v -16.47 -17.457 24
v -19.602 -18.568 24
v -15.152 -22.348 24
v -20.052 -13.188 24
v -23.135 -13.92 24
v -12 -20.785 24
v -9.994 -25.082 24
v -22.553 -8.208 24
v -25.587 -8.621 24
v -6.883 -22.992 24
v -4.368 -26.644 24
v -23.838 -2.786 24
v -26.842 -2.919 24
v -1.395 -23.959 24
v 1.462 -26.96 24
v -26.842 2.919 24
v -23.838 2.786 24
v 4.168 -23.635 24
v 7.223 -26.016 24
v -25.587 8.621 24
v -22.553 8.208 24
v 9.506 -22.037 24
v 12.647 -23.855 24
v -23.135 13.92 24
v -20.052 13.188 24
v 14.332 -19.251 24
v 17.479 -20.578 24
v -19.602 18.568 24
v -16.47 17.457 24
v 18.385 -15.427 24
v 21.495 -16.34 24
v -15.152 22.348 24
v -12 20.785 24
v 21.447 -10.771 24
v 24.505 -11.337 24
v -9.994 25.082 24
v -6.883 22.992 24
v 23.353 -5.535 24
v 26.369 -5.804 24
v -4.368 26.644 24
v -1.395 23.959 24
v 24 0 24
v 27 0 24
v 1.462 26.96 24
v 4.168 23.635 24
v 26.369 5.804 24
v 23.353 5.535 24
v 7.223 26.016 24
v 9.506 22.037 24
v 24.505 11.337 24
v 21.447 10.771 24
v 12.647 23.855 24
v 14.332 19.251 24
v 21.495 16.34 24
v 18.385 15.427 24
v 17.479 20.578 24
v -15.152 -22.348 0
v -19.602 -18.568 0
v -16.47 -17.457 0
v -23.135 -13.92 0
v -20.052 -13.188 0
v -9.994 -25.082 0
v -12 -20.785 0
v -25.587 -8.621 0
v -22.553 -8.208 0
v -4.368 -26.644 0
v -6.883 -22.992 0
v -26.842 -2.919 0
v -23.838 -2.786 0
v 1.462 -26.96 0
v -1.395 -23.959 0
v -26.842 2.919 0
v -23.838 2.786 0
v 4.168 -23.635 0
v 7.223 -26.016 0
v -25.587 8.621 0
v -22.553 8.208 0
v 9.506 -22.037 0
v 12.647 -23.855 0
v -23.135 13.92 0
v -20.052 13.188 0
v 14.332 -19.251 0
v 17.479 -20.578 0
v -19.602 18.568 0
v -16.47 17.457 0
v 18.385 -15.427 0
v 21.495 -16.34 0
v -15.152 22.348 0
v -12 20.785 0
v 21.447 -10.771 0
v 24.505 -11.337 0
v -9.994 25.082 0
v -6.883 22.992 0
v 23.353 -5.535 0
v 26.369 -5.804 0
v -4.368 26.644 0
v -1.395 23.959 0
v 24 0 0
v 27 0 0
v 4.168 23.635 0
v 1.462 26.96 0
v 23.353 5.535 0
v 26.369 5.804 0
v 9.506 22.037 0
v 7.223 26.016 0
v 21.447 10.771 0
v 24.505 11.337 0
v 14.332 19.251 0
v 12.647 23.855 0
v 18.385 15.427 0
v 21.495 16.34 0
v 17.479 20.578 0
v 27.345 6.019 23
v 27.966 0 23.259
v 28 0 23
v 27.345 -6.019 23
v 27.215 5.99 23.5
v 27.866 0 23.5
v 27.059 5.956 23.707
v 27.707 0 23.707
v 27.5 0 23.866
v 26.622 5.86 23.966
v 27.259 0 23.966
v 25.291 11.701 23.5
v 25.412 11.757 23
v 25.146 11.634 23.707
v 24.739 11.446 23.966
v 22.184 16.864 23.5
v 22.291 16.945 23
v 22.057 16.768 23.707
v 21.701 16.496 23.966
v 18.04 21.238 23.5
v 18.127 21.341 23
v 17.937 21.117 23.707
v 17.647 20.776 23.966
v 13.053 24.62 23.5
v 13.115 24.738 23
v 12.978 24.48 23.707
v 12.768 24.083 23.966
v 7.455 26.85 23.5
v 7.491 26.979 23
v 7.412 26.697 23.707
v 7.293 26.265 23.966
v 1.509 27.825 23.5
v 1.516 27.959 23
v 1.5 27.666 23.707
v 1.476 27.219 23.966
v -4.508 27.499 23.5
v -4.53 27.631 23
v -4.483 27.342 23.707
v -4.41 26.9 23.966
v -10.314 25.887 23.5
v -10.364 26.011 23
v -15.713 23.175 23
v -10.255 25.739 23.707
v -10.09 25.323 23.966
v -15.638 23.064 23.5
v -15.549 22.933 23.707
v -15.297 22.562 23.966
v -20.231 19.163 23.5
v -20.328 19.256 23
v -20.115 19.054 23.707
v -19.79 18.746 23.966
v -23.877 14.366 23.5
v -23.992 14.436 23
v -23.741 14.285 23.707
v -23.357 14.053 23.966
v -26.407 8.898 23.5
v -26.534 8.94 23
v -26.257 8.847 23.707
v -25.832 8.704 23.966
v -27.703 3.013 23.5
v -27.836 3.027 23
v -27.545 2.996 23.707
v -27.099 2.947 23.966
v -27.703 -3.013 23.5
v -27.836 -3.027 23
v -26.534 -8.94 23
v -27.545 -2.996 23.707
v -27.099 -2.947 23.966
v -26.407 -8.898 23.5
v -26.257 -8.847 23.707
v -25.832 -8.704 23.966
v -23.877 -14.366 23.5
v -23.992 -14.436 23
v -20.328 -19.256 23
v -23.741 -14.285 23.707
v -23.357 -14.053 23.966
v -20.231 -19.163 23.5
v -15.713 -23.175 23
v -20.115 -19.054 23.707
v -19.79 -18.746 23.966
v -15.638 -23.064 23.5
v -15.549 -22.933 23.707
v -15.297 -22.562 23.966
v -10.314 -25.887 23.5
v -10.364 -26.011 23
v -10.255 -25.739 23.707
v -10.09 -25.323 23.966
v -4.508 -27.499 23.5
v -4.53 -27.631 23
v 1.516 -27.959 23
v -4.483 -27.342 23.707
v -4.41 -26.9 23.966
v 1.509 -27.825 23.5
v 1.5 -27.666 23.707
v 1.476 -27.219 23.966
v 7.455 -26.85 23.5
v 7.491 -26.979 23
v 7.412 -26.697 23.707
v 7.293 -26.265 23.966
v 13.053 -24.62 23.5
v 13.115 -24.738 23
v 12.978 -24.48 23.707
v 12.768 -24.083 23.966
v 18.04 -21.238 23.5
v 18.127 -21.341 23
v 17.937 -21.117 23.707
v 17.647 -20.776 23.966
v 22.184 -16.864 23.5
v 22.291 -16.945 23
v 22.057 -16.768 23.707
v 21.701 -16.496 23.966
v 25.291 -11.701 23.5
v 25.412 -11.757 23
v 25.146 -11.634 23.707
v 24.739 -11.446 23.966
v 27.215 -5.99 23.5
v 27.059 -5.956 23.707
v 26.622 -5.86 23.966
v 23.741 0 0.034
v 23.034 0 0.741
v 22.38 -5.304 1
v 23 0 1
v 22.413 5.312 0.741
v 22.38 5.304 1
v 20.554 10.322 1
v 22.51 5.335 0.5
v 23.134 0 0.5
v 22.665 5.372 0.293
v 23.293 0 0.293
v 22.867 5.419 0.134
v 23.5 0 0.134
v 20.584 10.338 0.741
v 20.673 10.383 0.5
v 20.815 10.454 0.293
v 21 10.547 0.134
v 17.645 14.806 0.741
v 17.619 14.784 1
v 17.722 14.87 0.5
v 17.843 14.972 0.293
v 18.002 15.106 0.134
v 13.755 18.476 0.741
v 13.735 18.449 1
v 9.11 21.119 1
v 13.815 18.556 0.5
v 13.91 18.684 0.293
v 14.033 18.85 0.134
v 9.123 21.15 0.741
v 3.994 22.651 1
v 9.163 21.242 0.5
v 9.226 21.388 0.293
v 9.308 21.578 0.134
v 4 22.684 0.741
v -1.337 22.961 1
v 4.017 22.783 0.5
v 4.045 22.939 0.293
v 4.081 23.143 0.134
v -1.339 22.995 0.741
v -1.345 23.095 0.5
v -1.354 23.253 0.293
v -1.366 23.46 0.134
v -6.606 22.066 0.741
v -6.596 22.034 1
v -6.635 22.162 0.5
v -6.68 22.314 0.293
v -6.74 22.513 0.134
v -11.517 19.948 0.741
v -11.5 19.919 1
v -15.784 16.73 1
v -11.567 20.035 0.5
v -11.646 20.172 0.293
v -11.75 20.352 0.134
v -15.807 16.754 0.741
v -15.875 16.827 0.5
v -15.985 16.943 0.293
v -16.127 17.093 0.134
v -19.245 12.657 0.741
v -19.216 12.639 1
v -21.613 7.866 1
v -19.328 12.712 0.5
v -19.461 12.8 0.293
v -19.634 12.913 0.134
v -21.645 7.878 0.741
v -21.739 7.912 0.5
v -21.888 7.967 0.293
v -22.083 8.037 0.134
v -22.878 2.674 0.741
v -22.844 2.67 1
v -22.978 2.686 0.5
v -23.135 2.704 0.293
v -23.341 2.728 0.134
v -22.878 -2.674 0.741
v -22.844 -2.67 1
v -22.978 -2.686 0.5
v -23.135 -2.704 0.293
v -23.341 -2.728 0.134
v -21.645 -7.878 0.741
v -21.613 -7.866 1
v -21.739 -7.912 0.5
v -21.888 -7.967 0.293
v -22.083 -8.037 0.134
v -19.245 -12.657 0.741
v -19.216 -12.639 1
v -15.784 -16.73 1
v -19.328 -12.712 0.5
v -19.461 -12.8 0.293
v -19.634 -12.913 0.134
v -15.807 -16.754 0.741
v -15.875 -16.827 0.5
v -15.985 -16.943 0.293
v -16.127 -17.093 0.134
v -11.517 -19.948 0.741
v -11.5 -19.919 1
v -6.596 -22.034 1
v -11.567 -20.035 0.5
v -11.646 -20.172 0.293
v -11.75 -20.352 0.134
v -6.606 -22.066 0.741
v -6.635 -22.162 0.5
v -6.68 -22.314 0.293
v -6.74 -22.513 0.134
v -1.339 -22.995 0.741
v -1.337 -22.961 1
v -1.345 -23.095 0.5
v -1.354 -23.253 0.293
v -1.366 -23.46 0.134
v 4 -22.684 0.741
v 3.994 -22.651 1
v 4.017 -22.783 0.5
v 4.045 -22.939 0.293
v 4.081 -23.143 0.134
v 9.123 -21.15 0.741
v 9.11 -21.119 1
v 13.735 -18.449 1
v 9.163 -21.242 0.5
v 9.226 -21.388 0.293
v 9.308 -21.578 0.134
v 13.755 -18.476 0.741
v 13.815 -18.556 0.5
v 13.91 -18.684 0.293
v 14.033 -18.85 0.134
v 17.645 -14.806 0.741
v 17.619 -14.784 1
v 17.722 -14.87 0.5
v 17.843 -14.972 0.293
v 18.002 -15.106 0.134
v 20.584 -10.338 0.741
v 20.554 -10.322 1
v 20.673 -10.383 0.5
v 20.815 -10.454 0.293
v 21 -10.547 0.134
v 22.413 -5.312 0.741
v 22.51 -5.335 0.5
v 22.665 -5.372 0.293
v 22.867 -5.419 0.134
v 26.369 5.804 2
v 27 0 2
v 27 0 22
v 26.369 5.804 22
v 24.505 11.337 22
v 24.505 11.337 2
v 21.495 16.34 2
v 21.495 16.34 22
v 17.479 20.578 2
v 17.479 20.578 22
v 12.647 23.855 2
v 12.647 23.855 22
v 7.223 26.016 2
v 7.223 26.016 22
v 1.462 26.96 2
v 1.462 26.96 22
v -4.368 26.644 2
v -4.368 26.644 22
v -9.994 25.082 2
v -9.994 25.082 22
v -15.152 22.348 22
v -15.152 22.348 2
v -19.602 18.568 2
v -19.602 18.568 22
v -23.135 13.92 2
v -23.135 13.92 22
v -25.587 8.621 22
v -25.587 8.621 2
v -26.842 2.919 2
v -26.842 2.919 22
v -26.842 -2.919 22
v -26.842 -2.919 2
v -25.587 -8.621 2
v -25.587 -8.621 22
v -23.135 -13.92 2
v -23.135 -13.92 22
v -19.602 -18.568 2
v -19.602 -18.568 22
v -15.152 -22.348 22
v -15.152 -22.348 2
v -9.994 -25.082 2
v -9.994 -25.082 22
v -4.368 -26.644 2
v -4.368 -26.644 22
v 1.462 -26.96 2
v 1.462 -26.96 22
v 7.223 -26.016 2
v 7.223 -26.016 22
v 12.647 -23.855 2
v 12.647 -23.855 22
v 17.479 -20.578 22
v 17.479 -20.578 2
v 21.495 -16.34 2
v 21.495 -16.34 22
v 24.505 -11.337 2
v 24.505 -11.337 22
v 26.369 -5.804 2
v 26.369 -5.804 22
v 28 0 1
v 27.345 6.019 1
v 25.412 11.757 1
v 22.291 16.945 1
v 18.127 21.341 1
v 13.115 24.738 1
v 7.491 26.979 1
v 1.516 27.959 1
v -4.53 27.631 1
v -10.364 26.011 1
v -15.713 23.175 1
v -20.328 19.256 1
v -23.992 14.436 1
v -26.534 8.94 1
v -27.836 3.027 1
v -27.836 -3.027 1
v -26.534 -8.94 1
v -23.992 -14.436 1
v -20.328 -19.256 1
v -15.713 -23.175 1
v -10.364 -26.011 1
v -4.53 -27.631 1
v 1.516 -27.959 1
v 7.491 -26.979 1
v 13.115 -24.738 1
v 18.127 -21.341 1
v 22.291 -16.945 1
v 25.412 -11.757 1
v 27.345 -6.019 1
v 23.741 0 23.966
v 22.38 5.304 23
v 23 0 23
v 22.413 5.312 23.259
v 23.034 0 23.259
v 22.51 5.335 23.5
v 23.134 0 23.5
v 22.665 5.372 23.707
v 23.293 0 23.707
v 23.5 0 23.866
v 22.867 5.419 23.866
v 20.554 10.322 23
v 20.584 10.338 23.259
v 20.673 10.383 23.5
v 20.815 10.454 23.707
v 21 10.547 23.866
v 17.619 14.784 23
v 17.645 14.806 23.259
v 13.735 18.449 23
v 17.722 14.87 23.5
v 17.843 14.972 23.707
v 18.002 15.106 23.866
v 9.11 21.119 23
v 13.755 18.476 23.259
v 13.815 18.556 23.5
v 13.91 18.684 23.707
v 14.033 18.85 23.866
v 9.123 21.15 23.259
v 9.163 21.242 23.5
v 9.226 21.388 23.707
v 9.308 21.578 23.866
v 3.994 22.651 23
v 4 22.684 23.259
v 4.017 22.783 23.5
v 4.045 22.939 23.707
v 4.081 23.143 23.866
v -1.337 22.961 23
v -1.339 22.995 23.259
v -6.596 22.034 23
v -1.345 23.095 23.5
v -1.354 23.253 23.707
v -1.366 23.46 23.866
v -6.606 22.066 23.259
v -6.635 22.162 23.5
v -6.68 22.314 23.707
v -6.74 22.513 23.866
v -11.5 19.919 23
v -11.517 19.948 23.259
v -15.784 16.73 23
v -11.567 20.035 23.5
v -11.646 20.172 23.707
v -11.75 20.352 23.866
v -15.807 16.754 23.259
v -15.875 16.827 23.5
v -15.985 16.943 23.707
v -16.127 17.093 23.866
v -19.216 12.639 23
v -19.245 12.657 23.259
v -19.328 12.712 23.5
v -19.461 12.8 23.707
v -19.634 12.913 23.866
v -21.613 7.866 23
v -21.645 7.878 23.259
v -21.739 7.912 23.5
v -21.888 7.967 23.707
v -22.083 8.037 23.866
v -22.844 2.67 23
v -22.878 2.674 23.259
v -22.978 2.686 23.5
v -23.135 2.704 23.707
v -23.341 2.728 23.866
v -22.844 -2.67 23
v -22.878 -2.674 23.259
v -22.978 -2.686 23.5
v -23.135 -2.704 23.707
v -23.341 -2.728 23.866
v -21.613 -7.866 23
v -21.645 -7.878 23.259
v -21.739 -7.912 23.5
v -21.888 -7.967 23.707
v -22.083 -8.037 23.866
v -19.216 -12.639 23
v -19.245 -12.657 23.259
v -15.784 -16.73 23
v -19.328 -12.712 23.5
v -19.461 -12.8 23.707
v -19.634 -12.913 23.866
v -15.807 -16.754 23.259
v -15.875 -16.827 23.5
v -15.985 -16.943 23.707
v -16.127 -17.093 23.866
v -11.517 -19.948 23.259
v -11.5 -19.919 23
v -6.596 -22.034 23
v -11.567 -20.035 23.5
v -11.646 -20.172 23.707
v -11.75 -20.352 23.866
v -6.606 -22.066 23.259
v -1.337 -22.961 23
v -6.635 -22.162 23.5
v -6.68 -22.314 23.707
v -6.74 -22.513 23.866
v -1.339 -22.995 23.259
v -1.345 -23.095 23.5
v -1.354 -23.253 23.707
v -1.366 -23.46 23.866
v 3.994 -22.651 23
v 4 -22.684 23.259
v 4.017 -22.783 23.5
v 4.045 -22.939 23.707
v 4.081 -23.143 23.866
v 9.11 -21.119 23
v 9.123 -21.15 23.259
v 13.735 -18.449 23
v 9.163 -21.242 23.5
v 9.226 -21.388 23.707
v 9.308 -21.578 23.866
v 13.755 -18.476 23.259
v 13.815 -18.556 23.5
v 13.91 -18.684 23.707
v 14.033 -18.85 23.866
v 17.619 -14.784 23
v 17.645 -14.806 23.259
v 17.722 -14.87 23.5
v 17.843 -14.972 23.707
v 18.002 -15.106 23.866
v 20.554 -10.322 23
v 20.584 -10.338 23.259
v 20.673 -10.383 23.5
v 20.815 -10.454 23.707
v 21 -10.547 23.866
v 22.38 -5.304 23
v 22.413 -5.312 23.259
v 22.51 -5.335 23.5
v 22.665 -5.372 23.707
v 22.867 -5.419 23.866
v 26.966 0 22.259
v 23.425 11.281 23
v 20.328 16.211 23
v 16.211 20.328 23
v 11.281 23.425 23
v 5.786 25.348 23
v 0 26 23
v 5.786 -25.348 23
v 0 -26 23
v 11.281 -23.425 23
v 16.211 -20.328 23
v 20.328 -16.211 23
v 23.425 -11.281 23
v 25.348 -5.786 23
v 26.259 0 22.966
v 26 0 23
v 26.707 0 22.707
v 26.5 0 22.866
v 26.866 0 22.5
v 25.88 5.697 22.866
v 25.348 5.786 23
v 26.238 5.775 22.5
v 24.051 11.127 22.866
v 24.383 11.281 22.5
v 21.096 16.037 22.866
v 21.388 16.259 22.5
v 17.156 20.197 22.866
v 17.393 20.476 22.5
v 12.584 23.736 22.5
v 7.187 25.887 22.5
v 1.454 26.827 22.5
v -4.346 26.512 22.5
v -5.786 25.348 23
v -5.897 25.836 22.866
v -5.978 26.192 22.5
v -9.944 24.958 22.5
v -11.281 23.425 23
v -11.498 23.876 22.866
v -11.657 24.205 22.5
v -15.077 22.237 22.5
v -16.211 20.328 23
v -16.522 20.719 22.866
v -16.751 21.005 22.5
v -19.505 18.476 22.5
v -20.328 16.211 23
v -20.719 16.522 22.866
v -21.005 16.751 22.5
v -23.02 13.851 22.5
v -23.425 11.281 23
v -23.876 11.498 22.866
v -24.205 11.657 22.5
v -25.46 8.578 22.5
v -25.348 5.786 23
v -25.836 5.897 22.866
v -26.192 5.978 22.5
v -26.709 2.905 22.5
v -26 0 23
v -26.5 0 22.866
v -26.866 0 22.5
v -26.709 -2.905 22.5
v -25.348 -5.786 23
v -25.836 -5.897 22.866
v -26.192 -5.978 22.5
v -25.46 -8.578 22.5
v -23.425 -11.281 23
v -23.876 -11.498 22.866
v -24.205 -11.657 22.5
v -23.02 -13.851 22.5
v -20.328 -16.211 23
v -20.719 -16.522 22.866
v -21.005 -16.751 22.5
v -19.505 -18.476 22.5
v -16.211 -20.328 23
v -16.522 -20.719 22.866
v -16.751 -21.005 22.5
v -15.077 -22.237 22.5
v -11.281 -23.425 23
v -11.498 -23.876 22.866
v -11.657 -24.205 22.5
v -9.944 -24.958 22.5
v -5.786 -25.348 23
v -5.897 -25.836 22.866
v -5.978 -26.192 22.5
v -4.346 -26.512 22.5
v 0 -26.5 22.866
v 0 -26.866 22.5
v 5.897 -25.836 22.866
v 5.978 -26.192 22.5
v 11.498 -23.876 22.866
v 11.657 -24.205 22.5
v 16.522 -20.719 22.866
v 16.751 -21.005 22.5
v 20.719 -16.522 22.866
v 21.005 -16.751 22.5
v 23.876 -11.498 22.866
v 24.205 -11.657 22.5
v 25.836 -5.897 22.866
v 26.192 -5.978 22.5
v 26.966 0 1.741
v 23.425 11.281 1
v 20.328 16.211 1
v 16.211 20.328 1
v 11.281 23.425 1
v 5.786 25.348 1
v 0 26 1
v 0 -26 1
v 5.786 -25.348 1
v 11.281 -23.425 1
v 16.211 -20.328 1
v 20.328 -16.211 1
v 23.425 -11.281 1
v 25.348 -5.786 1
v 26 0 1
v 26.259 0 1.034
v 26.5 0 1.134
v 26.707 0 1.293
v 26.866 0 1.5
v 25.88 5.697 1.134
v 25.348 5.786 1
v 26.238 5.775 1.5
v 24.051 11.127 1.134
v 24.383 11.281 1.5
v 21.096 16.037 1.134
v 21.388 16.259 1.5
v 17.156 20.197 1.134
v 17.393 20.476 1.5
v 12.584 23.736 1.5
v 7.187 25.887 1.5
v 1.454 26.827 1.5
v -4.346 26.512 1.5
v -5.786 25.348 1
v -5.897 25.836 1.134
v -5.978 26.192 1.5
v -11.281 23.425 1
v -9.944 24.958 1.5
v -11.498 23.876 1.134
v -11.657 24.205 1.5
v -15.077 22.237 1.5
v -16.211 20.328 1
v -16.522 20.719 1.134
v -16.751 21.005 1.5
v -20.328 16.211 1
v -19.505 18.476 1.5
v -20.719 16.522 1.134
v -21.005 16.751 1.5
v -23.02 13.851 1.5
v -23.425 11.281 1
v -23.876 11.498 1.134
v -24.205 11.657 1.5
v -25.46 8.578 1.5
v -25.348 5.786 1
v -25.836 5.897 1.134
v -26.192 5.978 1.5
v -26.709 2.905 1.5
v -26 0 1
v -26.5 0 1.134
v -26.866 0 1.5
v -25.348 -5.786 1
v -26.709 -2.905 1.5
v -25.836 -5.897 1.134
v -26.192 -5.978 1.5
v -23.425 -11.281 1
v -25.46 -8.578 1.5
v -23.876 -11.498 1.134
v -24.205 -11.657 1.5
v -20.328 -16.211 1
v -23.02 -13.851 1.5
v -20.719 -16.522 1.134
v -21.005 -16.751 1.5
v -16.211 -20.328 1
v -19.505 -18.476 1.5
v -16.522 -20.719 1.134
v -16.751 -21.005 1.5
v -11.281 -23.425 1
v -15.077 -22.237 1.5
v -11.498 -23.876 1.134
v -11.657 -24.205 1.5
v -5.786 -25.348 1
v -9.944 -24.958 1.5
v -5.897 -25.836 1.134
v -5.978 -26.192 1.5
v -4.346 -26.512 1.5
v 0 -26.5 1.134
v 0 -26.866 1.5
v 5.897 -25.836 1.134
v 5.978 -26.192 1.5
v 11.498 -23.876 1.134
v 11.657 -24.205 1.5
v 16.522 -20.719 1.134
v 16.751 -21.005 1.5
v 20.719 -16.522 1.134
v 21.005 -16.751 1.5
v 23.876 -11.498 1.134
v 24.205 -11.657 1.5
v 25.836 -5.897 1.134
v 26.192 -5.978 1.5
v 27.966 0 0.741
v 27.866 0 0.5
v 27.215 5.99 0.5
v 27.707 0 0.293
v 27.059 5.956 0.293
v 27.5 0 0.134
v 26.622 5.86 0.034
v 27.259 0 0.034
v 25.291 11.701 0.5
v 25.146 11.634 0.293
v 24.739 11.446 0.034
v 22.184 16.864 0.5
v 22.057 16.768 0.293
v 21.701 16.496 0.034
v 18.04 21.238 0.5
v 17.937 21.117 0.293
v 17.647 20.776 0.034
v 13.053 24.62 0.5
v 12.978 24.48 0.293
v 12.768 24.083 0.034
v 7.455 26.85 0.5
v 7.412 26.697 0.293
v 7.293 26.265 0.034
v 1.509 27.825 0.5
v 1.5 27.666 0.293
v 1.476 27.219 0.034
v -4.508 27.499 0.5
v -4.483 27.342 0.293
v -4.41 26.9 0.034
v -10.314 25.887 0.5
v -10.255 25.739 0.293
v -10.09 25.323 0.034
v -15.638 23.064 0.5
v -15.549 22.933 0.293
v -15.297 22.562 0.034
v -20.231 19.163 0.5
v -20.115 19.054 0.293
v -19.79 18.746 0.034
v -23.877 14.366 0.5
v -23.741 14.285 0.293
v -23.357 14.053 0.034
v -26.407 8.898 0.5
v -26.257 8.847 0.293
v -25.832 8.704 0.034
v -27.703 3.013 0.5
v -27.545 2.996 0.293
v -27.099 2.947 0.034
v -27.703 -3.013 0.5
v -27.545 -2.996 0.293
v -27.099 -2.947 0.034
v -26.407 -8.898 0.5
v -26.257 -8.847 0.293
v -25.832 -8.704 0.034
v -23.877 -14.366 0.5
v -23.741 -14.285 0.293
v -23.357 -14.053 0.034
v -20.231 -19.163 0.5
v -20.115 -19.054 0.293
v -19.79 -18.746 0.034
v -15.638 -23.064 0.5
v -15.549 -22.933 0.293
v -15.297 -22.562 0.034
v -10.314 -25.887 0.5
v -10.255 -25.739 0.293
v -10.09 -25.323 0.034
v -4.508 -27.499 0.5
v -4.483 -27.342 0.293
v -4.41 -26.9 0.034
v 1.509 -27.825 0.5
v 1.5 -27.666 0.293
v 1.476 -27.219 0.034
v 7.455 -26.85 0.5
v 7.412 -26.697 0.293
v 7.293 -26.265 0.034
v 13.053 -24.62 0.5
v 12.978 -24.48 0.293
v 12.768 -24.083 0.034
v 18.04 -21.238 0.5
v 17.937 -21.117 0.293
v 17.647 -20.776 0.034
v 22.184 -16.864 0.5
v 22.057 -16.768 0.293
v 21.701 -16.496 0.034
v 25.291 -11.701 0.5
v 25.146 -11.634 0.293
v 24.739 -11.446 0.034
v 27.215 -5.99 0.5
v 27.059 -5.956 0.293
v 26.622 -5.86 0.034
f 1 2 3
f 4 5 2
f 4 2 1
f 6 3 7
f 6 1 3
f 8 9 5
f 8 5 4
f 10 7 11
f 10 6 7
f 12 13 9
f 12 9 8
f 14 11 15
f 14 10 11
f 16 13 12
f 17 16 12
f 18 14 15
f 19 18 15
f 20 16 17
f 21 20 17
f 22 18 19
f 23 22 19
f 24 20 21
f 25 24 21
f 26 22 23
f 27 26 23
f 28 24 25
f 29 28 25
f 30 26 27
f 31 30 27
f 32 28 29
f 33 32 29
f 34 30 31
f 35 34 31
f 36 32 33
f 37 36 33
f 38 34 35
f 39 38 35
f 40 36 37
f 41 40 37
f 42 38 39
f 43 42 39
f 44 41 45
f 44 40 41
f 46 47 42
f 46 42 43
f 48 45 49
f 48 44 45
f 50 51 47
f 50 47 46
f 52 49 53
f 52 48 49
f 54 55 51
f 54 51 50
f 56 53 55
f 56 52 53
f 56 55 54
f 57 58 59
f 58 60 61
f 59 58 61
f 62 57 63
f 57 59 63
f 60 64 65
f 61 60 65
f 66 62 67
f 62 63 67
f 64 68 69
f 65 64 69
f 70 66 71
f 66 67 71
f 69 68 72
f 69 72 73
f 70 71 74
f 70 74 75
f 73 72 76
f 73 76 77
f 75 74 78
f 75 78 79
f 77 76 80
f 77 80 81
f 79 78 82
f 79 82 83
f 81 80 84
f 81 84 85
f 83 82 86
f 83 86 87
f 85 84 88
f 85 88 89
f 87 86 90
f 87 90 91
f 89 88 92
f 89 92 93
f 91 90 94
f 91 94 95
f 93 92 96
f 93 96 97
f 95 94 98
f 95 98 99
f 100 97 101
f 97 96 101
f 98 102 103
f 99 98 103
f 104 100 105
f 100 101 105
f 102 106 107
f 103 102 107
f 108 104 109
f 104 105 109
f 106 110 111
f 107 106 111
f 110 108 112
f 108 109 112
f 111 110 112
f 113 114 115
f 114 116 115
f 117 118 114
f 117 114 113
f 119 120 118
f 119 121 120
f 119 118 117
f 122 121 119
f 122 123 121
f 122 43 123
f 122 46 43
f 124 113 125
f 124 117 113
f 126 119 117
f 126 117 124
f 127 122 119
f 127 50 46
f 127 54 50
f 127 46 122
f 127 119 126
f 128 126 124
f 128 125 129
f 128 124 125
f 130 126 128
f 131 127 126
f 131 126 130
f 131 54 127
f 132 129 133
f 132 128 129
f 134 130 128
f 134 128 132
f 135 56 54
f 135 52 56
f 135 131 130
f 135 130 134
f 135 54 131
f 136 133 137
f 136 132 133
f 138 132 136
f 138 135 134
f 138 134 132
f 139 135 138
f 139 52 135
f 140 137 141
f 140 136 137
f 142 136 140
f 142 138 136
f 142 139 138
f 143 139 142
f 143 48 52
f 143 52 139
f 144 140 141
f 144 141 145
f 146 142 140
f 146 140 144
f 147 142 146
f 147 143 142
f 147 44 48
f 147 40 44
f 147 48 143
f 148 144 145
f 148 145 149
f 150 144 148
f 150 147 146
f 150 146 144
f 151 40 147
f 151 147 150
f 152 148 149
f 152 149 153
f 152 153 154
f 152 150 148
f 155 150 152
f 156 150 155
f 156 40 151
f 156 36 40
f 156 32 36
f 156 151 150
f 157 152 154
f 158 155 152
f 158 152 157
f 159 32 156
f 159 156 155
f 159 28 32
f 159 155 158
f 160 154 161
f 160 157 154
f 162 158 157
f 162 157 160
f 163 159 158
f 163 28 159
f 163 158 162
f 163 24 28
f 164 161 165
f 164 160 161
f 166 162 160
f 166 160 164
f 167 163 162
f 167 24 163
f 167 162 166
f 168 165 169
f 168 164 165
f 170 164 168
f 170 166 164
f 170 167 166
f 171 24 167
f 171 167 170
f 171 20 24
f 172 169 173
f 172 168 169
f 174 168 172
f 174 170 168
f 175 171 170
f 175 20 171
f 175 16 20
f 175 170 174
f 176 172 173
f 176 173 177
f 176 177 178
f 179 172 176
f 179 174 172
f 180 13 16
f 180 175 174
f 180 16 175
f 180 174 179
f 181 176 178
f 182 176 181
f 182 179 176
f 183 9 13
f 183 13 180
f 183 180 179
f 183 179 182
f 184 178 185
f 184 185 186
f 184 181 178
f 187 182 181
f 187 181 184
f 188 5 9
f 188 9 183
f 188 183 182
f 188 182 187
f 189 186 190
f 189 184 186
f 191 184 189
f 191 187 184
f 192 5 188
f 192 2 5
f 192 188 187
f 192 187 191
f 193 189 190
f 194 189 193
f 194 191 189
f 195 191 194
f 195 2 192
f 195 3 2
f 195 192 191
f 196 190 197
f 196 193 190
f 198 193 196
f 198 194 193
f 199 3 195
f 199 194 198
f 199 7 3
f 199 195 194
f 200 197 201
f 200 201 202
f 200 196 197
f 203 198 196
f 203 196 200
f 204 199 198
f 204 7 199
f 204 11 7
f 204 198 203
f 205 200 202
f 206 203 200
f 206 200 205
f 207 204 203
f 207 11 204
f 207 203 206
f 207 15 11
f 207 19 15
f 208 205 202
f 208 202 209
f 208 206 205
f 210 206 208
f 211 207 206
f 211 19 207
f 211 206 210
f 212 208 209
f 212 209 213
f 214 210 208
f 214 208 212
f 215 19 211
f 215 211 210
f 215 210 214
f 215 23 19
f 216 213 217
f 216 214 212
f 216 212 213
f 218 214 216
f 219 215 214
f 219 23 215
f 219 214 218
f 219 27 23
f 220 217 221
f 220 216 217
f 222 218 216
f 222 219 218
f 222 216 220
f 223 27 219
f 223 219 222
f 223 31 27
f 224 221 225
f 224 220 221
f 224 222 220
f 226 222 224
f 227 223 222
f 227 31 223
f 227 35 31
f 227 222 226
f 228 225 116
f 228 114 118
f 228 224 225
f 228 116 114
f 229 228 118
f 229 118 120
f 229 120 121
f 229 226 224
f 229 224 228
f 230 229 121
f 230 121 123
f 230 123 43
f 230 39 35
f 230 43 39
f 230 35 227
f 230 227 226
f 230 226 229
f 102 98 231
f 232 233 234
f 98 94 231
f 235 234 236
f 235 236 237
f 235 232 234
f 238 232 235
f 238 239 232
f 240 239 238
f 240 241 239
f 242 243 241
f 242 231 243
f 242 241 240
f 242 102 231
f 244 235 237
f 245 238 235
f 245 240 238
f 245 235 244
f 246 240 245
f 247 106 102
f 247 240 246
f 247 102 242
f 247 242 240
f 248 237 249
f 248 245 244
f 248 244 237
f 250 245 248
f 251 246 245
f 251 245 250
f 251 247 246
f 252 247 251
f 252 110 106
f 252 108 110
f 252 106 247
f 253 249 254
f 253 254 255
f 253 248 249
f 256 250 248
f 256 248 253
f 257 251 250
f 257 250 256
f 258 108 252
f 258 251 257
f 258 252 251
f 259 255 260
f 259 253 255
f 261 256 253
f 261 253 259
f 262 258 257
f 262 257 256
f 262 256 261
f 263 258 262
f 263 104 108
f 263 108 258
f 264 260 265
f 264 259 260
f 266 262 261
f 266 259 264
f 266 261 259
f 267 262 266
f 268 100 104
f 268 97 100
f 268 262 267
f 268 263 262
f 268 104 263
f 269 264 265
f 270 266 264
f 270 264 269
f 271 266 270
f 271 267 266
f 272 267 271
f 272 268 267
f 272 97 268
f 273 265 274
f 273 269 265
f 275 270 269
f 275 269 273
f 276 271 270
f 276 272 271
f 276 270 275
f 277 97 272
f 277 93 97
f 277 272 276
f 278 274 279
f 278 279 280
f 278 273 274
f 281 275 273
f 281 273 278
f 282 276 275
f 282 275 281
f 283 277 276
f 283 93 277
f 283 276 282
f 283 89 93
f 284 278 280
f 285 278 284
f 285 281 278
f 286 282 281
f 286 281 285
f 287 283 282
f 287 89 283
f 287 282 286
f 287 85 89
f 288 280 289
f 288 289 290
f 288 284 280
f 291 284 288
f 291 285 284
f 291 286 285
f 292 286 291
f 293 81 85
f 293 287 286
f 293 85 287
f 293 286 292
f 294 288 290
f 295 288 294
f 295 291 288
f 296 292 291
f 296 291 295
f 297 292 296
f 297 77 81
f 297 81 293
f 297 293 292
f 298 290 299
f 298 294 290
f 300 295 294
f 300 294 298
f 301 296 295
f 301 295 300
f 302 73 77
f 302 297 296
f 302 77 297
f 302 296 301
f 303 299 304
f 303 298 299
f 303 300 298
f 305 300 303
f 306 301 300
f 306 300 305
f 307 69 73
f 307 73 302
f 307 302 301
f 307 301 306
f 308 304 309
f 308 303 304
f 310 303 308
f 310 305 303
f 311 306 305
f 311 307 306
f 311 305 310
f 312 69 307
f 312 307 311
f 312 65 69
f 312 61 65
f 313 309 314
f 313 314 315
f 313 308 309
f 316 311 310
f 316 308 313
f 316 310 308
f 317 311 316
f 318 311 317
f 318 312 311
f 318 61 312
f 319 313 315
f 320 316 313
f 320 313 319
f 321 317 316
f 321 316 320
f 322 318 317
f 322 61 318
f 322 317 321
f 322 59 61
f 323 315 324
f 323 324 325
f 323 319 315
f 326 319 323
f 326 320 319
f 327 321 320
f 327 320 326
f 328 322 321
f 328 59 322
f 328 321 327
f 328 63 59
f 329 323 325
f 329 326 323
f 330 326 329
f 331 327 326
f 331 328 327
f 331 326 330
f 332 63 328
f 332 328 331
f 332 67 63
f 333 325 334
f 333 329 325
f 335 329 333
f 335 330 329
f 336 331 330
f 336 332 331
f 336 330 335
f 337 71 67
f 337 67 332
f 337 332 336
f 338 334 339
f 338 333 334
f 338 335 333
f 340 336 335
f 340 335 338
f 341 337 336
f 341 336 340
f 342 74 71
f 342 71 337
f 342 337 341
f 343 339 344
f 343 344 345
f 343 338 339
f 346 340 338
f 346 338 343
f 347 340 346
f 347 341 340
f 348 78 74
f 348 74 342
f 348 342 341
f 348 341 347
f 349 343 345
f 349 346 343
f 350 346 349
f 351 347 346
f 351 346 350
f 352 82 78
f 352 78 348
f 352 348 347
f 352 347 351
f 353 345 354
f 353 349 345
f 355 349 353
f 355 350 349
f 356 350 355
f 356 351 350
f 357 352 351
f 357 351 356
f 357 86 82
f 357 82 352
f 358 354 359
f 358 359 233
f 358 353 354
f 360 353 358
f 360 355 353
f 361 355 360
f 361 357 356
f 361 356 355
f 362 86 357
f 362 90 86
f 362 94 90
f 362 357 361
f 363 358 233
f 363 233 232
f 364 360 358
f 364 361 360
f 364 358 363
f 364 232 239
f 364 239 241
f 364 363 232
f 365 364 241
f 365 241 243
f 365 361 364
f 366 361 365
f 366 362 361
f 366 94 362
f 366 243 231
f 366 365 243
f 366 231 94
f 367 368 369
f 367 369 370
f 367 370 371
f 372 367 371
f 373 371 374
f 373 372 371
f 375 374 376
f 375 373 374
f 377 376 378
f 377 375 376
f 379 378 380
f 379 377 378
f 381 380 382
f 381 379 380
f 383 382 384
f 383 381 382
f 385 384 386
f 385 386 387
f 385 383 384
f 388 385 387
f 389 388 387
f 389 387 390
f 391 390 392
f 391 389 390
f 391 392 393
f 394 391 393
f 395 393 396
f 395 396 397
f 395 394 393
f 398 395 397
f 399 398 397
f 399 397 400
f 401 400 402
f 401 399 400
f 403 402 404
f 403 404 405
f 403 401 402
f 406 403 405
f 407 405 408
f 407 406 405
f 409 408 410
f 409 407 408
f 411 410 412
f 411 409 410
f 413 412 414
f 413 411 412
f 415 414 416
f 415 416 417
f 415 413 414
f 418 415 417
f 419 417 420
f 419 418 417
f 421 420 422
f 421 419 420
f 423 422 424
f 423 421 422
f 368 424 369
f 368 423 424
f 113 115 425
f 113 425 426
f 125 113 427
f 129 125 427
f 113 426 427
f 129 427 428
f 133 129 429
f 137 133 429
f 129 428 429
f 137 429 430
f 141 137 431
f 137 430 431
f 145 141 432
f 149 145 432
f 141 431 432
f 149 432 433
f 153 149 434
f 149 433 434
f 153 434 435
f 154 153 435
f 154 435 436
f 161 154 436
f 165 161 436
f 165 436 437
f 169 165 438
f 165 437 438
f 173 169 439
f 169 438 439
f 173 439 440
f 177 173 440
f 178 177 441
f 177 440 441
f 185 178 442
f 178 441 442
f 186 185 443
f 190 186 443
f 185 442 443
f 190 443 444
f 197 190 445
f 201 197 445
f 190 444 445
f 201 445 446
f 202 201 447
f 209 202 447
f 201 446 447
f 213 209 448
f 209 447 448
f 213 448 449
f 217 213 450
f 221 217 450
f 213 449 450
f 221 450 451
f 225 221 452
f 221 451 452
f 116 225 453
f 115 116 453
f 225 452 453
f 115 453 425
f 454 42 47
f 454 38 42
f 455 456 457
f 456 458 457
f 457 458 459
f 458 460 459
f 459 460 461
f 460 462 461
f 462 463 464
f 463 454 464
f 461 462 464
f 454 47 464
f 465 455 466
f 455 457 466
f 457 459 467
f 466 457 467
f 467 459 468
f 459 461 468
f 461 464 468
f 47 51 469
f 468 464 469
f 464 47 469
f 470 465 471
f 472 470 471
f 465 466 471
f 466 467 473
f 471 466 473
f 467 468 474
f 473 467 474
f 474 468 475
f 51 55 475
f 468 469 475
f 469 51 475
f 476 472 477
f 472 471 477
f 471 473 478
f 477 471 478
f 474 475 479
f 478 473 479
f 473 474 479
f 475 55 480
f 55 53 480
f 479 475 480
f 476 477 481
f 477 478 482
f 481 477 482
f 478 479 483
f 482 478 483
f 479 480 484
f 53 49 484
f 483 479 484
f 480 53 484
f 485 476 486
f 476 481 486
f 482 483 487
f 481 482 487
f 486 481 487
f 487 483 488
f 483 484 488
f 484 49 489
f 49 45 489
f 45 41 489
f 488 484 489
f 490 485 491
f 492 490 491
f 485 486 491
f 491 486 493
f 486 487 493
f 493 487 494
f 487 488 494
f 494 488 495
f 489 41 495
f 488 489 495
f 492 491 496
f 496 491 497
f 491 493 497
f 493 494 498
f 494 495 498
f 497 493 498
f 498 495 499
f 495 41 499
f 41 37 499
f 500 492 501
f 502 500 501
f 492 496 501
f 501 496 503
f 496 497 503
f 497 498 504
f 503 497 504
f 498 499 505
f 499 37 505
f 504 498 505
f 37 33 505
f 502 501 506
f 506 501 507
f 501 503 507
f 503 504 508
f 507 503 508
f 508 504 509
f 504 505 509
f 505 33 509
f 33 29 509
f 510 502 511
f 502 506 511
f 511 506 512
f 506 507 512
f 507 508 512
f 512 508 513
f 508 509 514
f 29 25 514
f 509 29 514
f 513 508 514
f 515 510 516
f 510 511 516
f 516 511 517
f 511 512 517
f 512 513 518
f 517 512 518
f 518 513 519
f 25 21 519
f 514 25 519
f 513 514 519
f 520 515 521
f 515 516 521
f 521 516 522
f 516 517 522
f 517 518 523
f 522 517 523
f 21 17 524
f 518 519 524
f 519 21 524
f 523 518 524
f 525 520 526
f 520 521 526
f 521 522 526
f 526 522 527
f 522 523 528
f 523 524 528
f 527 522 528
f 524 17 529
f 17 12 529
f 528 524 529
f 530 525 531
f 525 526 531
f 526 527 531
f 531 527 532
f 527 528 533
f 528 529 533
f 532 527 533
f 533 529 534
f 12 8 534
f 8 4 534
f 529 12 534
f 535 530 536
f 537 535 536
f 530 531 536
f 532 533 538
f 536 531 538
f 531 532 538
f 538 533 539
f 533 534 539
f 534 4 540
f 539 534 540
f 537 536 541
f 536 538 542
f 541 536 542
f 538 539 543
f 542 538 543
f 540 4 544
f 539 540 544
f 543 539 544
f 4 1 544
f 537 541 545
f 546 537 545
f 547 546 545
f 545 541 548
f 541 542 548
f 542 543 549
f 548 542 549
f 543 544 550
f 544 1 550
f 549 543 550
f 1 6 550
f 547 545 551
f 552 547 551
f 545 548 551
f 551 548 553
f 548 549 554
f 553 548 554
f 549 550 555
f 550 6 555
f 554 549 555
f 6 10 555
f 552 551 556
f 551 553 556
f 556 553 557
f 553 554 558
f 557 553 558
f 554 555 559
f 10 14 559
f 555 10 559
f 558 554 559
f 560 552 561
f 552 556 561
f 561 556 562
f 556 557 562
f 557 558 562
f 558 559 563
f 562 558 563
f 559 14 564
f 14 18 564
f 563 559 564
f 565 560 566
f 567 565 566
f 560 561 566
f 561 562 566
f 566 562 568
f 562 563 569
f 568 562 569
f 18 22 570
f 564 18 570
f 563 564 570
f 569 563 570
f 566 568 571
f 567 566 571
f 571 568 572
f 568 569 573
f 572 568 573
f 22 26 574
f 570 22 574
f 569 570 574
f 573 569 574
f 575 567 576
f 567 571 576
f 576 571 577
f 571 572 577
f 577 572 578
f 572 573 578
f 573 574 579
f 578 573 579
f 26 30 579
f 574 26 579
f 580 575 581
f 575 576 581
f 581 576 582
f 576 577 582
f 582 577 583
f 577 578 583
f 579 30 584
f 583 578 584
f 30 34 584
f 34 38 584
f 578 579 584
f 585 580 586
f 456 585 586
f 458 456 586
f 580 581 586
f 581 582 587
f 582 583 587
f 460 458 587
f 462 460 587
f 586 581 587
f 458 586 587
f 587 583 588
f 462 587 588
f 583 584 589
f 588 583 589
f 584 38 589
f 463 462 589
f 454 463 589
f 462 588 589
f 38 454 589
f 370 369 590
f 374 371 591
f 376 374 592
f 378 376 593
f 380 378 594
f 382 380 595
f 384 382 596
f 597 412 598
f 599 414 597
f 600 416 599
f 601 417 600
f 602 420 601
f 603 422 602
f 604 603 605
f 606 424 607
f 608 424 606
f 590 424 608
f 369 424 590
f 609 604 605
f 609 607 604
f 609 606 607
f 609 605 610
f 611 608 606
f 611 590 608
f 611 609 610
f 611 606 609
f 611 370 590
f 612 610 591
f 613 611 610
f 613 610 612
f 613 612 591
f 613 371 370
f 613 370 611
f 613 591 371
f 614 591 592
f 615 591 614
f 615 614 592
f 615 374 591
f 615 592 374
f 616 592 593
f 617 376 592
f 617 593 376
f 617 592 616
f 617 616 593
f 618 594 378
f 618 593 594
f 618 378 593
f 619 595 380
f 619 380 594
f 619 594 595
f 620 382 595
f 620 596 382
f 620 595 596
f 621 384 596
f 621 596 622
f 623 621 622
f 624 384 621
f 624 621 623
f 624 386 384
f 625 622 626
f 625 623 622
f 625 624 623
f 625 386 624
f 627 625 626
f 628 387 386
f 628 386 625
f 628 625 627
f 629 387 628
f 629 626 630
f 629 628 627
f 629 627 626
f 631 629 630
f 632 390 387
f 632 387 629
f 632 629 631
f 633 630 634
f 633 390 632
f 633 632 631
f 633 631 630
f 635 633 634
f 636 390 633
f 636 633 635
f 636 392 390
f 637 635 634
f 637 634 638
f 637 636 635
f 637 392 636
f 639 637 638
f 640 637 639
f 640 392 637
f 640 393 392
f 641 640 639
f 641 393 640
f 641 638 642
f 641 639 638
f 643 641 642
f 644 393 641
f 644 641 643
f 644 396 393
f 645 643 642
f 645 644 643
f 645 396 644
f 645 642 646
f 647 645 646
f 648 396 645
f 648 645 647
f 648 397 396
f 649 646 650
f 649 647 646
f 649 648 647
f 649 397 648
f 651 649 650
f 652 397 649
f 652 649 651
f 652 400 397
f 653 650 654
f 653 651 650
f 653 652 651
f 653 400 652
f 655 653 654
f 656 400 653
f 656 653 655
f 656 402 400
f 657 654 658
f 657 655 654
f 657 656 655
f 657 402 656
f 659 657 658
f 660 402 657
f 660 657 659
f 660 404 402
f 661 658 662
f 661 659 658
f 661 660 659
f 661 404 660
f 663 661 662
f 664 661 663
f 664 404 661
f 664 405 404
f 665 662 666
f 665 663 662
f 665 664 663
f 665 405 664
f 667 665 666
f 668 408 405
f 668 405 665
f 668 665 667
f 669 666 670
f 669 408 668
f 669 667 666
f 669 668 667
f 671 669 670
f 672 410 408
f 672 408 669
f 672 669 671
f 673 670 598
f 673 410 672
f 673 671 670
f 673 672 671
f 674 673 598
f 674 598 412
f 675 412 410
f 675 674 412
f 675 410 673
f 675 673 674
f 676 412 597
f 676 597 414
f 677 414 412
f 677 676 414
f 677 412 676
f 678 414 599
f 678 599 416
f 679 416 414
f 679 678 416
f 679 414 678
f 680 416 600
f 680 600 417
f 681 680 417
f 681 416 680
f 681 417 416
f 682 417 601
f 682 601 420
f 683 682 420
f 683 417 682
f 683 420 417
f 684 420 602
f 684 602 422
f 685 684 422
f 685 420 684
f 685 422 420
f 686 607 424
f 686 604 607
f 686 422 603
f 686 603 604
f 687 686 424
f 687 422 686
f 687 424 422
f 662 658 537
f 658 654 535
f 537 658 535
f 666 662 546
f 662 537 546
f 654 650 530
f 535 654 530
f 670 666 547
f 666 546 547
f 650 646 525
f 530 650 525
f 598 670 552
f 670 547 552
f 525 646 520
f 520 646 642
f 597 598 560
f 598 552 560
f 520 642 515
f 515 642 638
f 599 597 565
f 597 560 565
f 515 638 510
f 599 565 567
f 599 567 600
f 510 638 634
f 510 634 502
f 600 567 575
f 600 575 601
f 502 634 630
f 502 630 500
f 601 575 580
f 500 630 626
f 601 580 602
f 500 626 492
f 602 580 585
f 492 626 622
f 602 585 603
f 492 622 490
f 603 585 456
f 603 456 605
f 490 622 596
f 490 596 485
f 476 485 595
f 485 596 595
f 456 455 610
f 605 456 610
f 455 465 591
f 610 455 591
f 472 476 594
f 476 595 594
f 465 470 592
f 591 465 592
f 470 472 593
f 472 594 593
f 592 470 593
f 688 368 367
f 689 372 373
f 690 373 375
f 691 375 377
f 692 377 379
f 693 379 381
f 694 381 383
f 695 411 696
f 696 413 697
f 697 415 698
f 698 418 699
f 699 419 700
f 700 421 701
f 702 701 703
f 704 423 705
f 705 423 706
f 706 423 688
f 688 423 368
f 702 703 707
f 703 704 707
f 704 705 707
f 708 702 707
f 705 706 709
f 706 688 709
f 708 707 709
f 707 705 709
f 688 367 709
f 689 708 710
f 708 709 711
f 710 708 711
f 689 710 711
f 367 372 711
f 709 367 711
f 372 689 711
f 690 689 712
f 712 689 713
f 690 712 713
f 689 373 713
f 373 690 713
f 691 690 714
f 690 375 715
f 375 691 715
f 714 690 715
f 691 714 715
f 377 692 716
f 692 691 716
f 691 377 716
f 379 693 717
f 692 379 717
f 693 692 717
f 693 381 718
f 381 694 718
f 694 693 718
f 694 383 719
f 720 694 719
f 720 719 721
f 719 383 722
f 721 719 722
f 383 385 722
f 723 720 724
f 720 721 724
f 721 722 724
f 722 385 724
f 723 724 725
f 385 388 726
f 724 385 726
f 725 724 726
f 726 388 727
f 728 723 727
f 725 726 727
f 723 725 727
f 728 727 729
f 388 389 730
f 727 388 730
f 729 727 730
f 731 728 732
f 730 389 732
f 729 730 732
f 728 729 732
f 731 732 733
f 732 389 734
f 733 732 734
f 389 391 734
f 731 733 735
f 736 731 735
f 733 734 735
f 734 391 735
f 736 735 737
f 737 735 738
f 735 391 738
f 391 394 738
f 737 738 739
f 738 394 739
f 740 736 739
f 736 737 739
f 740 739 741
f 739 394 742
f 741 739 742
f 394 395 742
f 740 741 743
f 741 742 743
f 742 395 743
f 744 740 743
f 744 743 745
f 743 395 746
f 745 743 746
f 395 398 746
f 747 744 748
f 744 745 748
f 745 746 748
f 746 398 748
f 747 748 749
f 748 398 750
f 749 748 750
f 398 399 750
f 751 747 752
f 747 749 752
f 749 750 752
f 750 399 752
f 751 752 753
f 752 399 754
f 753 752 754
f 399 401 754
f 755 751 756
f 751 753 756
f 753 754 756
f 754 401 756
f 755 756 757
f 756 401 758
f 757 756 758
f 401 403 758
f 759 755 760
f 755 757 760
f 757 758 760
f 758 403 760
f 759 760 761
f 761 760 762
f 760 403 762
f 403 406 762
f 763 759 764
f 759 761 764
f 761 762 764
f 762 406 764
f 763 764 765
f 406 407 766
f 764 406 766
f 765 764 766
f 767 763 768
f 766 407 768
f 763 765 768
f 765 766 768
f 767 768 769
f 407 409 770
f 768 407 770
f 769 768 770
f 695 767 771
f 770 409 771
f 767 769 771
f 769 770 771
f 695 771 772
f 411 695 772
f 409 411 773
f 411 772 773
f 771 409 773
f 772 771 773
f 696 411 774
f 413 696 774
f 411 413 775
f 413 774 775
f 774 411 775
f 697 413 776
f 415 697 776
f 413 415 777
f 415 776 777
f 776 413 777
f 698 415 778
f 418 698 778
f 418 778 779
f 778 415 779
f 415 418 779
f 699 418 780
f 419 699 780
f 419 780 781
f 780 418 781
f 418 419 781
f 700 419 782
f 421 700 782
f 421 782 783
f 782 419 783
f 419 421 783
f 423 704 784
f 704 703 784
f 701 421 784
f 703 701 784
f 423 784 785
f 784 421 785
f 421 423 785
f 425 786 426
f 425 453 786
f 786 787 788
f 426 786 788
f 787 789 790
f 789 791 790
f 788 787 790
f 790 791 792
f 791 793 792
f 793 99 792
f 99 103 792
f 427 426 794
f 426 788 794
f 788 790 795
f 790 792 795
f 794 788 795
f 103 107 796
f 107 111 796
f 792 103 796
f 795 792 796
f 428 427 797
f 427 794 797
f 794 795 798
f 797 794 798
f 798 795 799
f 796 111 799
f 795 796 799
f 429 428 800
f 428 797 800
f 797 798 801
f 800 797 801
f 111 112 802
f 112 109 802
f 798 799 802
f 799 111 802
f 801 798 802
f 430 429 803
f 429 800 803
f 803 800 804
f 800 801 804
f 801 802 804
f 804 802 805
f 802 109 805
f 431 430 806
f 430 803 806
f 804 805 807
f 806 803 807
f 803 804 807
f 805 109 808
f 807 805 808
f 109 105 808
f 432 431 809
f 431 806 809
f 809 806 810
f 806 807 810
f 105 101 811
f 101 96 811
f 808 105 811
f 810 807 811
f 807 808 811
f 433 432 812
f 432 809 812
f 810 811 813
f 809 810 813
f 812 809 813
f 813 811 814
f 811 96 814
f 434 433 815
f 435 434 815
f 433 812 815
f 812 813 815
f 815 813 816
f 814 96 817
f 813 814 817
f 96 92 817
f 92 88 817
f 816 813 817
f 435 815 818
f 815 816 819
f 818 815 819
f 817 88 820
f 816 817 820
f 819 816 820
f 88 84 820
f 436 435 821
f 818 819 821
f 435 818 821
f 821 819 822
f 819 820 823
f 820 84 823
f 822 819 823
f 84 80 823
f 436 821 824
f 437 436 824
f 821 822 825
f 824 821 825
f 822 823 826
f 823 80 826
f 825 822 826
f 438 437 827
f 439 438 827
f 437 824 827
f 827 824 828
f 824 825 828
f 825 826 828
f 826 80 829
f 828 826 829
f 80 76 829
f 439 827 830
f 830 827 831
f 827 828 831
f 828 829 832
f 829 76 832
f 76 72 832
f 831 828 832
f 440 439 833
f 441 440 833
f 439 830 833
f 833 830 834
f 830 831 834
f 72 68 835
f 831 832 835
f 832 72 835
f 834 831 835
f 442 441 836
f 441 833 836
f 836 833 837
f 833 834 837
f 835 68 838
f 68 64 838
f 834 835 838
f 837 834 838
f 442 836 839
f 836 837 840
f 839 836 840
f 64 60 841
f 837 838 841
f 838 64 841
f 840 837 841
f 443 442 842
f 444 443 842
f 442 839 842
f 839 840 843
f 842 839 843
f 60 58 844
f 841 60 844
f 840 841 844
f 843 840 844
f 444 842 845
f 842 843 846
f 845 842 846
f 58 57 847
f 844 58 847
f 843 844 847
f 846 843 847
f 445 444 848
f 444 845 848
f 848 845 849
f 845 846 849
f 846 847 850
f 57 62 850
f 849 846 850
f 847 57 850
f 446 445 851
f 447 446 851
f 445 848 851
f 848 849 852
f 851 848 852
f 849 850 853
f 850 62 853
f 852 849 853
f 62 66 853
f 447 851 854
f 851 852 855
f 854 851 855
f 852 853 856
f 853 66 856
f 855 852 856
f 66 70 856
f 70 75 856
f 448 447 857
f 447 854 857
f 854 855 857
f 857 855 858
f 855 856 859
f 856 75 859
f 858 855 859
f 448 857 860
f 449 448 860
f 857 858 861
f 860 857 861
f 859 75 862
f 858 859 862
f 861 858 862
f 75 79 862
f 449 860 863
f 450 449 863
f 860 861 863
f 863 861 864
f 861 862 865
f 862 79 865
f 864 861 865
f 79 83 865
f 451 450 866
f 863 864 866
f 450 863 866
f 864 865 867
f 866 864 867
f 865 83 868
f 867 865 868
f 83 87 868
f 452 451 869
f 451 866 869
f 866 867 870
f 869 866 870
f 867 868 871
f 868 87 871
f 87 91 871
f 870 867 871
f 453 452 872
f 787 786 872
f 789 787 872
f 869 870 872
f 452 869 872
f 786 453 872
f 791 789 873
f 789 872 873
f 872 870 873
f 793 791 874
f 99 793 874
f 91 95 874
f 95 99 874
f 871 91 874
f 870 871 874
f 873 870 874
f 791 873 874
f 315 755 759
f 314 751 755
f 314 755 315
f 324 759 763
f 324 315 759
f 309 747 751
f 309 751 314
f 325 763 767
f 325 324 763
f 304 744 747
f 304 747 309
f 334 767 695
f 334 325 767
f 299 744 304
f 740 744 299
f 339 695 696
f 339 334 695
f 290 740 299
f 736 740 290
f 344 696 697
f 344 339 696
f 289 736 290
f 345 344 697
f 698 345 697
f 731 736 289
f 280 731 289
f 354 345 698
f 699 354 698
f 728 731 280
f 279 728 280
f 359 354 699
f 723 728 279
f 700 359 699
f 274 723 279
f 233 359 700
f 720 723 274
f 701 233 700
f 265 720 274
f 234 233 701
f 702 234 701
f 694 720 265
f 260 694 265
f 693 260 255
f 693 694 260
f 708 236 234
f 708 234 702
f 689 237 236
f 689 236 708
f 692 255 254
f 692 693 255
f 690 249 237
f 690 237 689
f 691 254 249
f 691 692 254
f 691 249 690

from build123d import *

# Parameters (mm, degrees)
SKETCH1_R           = 28
SKETCH1_R_2         = 23
BOSS_EXTRUDE1_DEPTH = 24
FILLET1_R           = 1
SHELL1_START        = 1
SHELL1_OUTLINE_R    = 27
SHELL1_OUTLINE_R_2  = 23
SHELL1_DEPTH        = 22
FILLET2_R           = 1


# Read off the part's stored shape, not the designer's step: Shell1
with BuildPart() as part:
    # Sketch1 → Boss-Extrude1 (new body)
    with BuildSketch(Plane.XY):
        Circle(SKETCH1_R)
        Circle(SKETCH1_R_2, mode=Mode.SUBTRACT)
    extrude(amount=BOSS_EXTRUDE1_DEPTH)

    # Fillet1
    fillet1_edges = [part.edges().sort_by_distance(p)[0] for p in [
        (-28, 0, 0),
        (-28, 0, 24),
        (-23, 0, 0),
        (-23, 0, 24),
    ]]
    fillet(fillet1_edges, radius=FILLET1_R)

    # Shell1 outline → Shell1 (cut)
    with BuildSketch(Plane.XY.offset(SHELL1_START)):
        Circle(SHELL1_OUTLINE_R)
        Circle(SHELL1_OUTLINE_R_2, mode=Mode.SUBTRACT)
    extrude(amount=SHELL1_DEPTH, mode=Mode.SUBTRACT)

    # Fillet2
    fillet2_edges = [part.edges().sort_by_distance(p)[0] for p in [
        (-27, 0, 23),
        (-27, 0, 1),
    ]]
    fillet(fillet2_edges, radius=FILLET2_R)


solid = part.part
